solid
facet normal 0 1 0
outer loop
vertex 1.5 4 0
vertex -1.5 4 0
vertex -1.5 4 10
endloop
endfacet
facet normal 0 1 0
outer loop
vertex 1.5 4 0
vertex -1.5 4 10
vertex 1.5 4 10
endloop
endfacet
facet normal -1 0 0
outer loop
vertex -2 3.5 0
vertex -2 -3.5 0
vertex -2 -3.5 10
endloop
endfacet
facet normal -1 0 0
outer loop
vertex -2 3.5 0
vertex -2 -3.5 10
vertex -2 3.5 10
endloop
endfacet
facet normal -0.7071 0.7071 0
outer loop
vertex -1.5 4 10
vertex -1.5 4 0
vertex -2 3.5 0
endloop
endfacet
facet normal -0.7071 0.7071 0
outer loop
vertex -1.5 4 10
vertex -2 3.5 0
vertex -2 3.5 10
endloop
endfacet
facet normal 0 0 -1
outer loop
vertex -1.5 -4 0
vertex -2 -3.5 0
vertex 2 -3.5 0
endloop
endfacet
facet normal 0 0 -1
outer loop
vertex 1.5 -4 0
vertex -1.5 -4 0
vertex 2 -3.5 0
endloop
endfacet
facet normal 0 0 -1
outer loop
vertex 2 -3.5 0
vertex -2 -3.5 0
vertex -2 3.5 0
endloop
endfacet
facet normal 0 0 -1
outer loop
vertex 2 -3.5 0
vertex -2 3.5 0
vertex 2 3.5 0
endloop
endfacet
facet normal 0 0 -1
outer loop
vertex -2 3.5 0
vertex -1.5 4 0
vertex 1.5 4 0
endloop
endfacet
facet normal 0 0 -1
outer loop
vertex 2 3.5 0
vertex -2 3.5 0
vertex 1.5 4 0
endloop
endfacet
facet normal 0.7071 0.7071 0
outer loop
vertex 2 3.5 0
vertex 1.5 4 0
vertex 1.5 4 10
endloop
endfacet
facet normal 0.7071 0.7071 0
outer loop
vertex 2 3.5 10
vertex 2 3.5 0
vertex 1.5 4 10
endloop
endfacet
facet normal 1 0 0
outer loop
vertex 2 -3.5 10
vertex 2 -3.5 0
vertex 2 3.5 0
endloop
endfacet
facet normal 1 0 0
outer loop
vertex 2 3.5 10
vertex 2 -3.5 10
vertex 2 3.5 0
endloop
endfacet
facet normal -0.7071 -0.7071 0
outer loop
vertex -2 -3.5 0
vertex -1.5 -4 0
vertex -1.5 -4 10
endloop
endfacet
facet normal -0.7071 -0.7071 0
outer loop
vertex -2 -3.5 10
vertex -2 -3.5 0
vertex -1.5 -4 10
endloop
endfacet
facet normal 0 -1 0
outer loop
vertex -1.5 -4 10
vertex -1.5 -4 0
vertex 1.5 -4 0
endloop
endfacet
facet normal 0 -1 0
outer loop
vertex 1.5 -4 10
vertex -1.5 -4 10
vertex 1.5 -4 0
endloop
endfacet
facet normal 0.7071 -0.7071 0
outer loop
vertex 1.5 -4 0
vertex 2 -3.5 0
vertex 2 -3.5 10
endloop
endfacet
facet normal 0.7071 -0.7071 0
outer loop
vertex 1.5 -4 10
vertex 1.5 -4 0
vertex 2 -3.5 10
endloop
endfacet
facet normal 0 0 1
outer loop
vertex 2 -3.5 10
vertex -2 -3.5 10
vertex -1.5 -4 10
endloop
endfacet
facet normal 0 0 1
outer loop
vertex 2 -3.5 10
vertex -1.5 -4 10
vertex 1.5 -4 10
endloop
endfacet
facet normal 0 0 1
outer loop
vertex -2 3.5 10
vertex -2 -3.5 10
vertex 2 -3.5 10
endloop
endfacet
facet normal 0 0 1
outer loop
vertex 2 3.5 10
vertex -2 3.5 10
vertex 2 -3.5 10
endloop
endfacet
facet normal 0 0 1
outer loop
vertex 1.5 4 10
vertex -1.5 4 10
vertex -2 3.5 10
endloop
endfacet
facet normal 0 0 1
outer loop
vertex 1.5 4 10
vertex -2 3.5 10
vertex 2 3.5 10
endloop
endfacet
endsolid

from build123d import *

# Parameters (mm, degrees)
SKETCH1_W           = 4
SKETCH1_H           = 8
BOSS_EXTRUDE1_DEPTH = 10
CHAMFER1_SIZE       = 0.5


with BuildPart() as part:
    # Sketch1 → Boss-Extrude1 (new body)
    with BuildSketch(Plane.XY):
        Rectangle(SKETCH1_W, SKETCH1_H)
    extrude(amount=BOSS_EXTRUDE1_DEPTH)

    # Chamfer1
    chamfer1_edges = [part.edges().sort_by_distance(p)[0] for p in [
        (2, -4, 5),
        (-2, -4, 5),
        (-2, 4, 5),
        (2, 4, 5),
    ]]
    chamfer(chamfer1_edges, length=CHAMFER1_SIZE)


solid = part.part
